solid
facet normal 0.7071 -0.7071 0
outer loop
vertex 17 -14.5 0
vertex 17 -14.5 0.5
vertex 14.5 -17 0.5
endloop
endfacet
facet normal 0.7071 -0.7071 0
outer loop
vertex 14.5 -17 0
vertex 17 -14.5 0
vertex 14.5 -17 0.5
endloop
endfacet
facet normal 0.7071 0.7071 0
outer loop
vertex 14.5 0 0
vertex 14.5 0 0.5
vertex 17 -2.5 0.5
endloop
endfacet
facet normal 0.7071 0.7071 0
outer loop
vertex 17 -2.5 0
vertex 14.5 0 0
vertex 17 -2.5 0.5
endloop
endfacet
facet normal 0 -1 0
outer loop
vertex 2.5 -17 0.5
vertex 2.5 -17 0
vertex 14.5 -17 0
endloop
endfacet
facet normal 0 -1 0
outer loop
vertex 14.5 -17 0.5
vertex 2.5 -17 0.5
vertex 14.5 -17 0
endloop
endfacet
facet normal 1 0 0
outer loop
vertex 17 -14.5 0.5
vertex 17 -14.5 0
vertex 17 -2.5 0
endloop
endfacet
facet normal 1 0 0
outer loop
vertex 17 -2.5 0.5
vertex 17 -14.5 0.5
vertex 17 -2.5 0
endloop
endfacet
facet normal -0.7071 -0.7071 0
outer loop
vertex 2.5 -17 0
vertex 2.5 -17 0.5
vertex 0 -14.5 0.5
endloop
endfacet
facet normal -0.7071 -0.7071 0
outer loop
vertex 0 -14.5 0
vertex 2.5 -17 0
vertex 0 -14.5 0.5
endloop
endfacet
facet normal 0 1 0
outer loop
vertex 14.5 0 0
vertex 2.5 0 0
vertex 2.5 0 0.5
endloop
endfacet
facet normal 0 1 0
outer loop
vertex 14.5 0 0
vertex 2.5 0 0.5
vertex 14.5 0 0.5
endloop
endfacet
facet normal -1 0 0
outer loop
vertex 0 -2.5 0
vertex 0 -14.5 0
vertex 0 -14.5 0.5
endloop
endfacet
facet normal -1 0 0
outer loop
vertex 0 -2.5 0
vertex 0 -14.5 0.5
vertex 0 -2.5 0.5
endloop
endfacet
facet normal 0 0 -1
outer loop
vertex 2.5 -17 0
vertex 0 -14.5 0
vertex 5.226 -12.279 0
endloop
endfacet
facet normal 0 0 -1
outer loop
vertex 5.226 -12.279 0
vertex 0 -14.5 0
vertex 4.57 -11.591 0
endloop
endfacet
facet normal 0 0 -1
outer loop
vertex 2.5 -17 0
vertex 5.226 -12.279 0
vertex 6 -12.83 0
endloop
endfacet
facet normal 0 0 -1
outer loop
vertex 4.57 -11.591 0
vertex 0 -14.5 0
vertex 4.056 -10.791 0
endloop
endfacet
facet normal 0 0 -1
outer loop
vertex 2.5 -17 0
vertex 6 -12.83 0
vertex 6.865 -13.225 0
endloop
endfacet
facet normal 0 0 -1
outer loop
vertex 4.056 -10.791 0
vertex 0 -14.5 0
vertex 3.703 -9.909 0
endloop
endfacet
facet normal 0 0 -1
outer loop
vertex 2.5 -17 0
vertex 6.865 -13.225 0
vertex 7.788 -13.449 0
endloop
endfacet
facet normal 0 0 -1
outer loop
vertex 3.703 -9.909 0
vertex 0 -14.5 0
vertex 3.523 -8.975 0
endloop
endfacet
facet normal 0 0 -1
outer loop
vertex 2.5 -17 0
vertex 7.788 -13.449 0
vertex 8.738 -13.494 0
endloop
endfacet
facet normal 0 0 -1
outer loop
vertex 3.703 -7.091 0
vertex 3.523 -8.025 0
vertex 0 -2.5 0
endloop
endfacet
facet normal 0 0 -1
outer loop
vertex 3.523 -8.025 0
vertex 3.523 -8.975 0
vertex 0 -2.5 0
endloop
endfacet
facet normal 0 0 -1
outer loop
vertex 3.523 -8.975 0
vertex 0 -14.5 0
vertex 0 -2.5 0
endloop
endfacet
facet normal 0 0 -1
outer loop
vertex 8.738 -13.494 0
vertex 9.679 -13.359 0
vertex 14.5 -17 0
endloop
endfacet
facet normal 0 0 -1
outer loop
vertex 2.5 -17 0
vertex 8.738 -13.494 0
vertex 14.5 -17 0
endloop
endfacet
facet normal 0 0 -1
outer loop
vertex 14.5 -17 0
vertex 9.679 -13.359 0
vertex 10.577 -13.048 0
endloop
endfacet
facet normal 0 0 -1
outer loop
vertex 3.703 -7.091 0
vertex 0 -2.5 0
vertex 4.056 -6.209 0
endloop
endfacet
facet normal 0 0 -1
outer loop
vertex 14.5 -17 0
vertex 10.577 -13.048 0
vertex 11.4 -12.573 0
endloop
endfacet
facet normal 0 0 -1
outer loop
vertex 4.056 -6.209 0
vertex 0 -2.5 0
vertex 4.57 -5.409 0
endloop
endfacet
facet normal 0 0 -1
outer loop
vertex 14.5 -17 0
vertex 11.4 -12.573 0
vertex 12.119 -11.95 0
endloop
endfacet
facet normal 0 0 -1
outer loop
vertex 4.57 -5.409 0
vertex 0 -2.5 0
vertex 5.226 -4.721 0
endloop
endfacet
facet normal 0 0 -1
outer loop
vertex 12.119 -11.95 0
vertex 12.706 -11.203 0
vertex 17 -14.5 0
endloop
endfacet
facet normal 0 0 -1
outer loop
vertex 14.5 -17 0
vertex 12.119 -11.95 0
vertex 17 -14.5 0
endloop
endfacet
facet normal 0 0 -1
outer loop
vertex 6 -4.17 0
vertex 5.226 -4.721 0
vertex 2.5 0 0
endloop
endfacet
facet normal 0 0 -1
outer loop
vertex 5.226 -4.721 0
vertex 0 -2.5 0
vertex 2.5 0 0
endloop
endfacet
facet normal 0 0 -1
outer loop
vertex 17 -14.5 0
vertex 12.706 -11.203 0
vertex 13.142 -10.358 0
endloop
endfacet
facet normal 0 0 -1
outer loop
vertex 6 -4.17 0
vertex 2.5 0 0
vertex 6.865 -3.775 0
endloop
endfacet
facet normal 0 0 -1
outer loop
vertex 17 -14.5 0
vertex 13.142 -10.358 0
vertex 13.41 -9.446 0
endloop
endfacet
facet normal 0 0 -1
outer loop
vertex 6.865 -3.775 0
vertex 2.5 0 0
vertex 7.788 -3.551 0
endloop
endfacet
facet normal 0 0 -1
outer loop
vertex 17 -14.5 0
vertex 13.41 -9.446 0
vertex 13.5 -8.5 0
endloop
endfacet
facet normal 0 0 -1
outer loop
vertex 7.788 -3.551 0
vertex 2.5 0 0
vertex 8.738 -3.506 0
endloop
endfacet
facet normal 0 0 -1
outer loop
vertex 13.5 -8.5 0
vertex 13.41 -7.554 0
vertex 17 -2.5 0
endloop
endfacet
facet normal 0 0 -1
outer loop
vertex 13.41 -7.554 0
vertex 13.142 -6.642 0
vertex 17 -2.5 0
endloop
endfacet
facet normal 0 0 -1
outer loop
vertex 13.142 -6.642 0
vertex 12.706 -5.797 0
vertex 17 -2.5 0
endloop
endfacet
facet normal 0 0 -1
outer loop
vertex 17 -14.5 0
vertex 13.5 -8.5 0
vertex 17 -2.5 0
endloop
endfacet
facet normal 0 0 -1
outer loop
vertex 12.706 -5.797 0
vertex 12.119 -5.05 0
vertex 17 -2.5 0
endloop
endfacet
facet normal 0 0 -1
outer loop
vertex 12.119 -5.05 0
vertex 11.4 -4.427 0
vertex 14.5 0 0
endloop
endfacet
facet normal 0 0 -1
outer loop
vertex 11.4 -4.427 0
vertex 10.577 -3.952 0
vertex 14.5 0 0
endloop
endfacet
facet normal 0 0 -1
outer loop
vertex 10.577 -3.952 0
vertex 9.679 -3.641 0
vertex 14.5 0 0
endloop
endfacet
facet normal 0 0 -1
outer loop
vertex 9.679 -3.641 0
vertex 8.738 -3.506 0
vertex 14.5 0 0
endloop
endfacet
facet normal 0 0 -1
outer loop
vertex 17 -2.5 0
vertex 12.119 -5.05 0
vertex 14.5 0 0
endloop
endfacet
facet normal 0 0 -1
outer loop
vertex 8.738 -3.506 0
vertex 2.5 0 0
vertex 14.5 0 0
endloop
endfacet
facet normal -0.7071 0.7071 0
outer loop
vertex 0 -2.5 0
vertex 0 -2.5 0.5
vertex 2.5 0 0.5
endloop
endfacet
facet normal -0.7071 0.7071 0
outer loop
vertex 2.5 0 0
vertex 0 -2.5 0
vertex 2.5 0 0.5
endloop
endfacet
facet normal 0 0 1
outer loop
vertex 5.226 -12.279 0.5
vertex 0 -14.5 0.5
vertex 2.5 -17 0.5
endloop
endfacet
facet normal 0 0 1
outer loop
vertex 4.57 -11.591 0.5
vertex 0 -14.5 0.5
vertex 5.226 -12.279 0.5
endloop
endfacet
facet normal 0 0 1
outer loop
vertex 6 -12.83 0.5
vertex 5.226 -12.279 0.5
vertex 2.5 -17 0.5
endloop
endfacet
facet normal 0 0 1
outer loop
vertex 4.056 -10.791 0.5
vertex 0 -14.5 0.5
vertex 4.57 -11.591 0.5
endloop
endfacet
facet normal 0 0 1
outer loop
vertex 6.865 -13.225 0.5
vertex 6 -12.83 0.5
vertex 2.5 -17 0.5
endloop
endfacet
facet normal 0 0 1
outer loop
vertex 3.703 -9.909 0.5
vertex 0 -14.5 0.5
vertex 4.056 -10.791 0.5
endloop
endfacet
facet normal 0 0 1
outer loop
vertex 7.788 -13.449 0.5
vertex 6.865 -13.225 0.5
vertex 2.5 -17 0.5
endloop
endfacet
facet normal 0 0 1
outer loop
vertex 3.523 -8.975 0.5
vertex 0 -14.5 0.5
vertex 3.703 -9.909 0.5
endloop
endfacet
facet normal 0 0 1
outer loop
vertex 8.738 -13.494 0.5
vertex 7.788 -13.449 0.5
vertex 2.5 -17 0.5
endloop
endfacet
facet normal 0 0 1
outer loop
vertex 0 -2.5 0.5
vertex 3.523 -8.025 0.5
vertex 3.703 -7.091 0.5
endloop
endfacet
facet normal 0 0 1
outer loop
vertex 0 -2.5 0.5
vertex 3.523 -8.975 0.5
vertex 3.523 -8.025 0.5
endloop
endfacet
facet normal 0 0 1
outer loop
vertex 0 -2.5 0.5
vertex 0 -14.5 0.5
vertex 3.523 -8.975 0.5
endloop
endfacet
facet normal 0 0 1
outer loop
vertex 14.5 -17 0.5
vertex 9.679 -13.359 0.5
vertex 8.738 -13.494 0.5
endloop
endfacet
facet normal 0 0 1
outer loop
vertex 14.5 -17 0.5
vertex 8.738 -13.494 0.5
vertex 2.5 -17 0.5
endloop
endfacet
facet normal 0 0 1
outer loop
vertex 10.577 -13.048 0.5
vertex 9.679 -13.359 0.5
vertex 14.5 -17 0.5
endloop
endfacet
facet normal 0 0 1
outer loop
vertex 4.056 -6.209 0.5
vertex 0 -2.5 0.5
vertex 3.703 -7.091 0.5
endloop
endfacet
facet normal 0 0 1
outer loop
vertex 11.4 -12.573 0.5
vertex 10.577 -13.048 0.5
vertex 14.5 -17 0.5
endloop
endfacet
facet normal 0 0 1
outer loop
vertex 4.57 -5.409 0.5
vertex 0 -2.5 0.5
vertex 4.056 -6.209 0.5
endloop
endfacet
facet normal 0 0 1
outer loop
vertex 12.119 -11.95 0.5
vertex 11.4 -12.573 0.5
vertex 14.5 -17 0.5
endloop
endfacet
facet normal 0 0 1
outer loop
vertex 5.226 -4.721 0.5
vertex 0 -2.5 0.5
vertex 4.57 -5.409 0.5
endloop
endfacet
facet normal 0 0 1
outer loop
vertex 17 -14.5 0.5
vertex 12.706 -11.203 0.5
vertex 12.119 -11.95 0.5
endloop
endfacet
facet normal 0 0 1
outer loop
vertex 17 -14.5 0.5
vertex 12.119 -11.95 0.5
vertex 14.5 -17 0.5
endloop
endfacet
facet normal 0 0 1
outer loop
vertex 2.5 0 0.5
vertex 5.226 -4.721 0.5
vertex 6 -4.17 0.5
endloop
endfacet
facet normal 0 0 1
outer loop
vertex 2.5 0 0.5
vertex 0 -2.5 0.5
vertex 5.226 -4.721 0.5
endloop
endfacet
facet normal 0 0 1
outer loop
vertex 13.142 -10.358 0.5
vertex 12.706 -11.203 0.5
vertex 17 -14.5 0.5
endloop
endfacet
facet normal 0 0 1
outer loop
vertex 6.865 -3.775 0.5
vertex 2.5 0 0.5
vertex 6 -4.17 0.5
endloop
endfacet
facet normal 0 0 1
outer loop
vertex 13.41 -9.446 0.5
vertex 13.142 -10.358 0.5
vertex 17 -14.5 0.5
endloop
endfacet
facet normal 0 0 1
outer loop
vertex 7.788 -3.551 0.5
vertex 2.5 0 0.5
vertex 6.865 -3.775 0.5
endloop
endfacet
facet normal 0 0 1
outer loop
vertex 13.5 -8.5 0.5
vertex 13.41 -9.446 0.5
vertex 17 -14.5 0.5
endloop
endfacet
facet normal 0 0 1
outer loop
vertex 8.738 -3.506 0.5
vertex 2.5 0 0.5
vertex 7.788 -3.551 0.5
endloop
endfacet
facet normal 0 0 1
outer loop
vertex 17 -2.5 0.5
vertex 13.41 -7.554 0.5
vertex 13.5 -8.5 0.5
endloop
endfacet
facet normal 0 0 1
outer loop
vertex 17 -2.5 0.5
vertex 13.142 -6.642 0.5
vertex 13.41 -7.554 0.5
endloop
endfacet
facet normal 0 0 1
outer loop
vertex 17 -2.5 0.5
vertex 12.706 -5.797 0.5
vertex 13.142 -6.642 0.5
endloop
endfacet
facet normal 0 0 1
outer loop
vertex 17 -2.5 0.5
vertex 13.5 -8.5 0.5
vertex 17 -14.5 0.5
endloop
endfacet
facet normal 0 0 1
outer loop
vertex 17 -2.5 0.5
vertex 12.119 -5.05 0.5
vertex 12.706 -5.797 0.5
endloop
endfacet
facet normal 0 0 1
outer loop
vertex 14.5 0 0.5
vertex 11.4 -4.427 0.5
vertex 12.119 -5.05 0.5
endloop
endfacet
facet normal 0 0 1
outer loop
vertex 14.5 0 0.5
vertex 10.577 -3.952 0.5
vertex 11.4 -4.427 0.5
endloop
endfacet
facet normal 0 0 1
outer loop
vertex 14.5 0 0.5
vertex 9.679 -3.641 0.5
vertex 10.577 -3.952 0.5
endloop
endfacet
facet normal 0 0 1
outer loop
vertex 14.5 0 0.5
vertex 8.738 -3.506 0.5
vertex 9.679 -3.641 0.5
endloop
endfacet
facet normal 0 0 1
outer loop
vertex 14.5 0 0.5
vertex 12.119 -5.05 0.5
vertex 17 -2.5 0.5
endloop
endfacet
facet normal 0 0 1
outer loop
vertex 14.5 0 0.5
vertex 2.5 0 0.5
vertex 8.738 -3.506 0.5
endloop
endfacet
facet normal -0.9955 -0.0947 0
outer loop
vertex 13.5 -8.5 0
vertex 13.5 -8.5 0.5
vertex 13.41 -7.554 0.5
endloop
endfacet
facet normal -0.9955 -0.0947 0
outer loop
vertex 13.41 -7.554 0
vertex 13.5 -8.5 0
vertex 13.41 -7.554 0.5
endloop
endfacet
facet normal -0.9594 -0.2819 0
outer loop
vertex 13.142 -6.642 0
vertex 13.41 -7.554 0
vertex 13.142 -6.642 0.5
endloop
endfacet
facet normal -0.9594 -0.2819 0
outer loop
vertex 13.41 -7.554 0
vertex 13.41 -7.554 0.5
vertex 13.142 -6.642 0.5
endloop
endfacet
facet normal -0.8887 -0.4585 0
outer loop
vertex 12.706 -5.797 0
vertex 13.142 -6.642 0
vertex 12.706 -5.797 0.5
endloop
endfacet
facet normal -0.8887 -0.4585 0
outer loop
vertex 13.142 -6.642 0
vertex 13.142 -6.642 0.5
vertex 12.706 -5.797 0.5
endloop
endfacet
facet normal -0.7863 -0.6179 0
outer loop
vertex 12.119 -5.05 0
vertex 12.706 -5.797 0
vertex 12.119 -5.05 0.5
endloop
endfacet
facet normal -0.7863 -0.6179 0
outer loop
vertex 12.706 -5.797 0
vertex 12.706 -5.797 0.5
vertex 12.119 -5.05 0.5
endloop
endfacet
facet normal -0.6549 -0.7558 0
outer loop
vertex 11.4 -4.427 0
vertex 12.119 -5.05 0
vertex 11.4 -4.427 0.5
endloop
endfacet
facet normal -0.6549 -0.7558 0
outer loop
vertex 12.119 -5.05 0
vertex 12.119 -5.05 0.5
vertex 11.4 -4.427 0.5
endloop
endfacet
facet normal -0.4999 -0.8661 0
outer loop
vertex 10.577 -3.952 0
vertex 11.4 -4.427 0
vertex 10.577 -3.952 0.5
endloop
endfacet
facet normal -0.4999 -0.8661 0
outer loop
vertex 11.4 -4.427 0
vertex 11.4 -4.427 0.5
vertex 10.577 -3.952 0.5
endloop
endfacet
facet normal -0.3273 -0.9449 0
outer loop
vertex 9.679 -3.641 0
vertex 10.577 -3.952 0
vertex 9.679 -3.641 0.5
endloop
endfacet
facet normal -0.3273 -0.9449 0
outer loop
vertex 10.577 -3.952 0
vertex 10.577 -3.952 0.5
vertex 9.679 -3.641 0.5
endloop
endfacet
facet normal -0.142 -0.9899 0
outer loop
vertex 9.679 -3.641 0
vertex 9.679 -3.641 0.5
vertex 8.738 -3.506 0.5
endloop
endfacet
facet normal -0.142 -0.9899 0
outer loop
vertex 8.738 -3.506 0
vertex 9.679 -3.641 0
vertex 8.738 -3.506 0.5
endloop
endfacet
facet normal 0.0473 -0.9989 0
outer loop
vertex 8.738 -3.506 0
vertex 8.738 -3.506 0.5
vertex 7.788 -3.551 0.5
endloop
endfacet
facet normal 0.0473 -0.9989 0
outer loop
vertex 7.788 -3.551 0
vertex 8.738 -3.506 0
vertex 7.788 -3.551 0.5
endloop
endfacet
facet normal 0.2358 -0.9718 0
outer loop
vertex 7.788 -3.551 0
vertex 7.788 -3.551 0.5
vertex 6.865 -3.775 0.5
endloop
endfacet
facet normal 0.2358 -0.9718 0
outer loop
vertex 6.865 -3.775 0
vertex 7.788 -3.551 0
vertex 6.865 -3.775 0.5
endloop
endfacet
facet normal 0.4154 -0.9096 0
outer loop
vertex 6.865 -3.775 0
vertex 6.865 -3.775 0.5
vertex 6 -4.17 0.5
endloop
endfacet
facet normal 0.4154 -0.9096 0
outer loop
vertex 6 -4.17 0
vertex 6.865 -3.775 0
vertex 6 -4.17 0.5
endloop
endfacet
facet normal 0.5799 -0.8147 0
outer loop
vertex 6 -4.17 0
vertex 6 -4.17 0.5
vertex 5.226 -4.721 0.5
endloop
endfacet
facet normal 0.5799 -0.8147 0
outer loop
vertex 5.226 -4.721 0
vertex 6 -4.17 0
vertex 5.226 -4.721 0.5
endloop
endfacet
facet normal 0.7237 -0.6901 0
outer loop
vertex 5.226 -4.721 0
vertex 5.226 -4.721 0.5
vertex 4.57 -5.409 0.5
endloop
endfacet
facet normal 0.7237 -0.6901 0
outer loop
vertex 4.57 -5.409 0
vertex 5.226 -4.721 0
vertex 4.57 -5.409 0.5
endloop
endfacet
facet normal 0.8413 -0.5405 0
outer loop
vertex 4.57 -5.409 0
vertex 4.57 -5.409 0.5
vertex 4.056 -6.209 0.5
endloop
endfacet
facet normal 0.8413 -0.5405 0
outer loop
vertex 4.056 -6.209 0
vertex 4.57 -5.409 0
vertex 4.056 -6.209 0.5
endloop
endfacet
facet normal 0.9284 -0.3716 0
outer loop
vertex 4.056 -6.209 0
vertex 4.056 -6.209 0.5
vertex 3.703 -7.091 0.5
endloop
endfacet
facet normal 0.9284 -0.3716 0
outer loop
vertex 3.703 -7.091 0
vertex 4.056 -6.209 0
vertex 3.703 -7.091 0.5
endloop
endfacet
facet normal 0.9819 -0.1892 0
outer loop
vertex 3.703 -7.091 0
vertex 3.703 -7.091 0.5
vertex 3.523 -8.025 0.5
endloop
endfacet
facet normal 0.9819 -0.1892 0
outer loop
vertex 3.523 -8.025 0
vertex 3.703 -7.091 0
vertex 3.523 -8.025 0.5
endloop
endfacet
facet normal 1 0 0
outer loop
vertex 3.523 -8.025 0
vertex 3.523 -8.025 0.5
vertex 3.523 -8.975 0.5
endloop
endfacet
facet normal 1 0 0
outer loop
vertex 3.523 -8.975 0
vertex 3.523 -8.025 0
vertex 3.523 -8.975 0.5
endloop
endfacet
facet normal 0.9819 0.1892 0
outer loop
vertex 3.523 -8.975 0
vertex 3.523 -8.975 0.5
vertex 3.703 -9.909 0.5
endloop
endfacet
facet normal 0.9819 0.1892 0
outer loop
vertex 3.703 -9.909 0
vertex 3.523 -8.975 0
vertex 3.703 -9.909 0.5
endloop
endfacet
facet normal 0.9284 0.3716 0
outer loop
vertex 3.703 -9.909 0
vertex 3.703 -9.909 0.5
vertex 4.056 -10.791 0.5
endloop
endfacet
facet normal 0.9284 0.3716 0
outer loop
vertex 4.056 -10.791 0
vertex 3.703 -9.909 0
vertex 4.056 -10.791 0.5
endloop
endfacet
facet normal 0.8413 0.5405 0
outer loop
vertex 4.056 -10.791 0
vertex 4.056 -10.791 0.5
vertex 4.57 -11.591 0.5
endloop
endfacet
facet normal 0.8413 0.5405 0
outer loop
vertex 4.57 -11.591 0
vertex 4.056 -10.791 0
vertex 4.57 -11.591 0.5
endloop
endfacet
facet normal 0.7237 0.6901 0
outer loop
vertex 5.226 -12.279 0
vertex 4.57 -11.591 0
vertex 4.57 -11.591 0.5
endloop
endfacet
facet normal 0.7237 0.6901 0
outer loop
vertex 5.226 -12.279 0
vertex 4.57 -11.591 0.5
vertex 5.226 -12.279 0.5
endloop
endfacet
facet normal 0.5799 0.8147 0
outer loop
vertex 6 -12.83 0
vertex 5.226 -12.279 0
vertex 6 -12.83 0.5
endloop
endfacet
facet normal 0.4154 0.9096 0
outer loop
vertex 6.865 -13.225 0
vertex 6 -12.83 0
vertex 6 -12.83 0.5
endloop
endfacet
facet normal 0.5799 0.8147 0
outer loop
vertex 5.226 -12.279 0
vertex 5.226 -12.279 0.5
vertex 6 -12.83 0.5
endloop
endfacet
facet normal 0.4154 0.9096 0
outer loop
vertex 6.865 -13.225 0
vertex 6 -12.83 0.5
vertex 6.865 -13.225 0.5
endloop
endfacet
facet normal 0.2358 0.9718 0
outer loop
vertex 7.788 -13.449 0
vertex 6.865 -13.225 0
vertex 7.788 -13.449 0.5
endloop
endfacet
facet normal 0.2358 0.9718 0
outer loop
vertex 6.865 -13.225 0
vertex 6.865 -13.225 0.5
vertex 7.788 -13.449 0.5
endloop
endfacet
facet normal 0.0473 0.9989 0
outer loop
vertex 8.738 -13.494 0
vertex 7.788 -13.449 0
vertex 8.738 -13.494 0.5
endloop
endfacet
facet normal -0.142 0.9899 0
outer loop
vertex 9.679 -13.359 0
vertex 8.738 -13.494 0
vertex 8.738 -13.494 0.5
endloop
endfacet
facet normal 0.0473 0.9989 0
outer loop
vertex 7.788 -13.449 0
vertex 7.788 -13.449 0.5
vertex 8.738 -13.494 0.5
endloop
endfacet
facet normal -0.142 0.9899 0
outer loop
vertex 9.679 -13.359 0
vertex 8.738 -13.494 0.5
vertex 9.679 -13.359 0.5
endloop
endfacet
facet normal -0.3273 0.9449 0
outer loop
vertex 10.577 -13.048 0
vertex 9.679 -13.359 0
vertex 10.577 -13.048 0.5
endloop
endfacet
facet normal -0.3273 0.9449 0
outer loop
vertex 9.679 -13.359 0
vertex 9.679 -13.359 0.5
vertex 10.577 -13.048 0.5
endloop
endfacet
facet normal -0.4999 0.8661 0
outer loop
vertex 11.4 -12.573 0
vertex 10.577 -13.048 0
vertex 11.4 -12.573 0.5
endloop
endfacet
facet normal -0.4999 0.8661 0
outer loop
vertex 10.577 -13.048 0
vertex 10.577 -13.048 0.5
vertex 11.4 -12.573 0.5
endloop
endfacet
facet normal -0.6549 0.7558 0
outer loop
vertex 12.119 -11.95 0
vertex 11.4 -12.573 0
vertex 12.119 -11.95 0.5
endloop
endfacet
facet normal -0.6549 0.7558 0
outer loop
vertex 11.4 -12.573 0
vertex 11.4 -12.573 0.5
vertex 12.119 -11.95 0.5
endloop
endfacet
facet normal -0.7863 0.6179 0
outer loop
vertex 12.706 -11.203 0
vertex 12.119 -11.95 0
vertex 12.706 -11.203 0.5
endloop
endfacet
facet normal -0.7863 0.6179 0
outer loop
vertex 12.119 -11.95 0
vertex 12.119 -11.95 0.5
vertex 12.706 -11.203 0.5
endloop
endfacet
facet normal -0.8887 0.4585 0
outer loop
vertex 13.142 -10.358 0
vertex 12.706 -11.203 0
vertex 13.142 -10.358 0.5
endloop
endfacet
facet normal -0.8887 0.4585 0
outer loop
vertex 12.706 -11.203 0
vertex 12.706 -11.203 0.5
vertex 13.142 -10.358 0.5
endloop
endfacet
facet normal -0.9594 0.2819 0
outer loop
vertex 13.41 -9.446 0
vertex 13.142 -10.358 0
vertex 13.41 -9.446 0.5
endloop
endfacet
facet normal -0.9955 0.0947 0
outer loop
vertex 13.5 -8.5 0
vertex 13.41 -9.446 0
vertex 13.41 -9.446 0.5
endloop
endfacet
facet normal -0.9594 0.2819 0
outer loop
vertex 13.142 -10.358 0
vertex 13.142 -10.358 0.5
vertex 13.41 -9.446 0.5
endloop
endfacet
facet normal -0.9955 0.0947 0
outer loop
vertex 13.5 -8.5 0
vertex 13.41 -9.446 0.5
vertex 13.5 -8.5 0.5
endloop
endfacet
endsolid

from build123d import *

# Parameters (mm, degrees)
SKETCH3_W           = 17
SKETCH3_H           = 17
BOSS_EXTRUDE1_DEPTH = 0.5
SKETCH4_R           = 5
CUT_EXTRUDE1_DEPTH  = 25.046829313


with BuildPart() as part:
    # Sketch3 → Boss-Extrude1 (new body)
    with BuildSketch(Plane.XY):
        with Locations((8.5, -8.5)):
            Rectangle(SKETCH3_W, SKETCH3_H)
    extrude(amount=BOSS_EXTRUDE1_DEPTH)

    # Sketch4 → Cut-Extrude1 (cut, through all)
    with BuildSketch(Plane.XY.offset(0.5)):
        with Locations((8.5, -8.5)):
            Circle(SKETCH4_R)
        Polygon((17, 0), (14.5, 0), (17, -2.5), align=None)
        Polygon((0, -2.5), (2.5, 0), (0, 0), align=None)
        Polygon((2.5, -17), (0, -14.5), (0, -17), align=None)
        Polygon((17, -17), (17, -14.5), (14.5, -17), align=None)
    extrude(amount=-CUT_EXTRUDE1_DEPTH, mode=Mode.SUBTRACT)


solid = part.part
